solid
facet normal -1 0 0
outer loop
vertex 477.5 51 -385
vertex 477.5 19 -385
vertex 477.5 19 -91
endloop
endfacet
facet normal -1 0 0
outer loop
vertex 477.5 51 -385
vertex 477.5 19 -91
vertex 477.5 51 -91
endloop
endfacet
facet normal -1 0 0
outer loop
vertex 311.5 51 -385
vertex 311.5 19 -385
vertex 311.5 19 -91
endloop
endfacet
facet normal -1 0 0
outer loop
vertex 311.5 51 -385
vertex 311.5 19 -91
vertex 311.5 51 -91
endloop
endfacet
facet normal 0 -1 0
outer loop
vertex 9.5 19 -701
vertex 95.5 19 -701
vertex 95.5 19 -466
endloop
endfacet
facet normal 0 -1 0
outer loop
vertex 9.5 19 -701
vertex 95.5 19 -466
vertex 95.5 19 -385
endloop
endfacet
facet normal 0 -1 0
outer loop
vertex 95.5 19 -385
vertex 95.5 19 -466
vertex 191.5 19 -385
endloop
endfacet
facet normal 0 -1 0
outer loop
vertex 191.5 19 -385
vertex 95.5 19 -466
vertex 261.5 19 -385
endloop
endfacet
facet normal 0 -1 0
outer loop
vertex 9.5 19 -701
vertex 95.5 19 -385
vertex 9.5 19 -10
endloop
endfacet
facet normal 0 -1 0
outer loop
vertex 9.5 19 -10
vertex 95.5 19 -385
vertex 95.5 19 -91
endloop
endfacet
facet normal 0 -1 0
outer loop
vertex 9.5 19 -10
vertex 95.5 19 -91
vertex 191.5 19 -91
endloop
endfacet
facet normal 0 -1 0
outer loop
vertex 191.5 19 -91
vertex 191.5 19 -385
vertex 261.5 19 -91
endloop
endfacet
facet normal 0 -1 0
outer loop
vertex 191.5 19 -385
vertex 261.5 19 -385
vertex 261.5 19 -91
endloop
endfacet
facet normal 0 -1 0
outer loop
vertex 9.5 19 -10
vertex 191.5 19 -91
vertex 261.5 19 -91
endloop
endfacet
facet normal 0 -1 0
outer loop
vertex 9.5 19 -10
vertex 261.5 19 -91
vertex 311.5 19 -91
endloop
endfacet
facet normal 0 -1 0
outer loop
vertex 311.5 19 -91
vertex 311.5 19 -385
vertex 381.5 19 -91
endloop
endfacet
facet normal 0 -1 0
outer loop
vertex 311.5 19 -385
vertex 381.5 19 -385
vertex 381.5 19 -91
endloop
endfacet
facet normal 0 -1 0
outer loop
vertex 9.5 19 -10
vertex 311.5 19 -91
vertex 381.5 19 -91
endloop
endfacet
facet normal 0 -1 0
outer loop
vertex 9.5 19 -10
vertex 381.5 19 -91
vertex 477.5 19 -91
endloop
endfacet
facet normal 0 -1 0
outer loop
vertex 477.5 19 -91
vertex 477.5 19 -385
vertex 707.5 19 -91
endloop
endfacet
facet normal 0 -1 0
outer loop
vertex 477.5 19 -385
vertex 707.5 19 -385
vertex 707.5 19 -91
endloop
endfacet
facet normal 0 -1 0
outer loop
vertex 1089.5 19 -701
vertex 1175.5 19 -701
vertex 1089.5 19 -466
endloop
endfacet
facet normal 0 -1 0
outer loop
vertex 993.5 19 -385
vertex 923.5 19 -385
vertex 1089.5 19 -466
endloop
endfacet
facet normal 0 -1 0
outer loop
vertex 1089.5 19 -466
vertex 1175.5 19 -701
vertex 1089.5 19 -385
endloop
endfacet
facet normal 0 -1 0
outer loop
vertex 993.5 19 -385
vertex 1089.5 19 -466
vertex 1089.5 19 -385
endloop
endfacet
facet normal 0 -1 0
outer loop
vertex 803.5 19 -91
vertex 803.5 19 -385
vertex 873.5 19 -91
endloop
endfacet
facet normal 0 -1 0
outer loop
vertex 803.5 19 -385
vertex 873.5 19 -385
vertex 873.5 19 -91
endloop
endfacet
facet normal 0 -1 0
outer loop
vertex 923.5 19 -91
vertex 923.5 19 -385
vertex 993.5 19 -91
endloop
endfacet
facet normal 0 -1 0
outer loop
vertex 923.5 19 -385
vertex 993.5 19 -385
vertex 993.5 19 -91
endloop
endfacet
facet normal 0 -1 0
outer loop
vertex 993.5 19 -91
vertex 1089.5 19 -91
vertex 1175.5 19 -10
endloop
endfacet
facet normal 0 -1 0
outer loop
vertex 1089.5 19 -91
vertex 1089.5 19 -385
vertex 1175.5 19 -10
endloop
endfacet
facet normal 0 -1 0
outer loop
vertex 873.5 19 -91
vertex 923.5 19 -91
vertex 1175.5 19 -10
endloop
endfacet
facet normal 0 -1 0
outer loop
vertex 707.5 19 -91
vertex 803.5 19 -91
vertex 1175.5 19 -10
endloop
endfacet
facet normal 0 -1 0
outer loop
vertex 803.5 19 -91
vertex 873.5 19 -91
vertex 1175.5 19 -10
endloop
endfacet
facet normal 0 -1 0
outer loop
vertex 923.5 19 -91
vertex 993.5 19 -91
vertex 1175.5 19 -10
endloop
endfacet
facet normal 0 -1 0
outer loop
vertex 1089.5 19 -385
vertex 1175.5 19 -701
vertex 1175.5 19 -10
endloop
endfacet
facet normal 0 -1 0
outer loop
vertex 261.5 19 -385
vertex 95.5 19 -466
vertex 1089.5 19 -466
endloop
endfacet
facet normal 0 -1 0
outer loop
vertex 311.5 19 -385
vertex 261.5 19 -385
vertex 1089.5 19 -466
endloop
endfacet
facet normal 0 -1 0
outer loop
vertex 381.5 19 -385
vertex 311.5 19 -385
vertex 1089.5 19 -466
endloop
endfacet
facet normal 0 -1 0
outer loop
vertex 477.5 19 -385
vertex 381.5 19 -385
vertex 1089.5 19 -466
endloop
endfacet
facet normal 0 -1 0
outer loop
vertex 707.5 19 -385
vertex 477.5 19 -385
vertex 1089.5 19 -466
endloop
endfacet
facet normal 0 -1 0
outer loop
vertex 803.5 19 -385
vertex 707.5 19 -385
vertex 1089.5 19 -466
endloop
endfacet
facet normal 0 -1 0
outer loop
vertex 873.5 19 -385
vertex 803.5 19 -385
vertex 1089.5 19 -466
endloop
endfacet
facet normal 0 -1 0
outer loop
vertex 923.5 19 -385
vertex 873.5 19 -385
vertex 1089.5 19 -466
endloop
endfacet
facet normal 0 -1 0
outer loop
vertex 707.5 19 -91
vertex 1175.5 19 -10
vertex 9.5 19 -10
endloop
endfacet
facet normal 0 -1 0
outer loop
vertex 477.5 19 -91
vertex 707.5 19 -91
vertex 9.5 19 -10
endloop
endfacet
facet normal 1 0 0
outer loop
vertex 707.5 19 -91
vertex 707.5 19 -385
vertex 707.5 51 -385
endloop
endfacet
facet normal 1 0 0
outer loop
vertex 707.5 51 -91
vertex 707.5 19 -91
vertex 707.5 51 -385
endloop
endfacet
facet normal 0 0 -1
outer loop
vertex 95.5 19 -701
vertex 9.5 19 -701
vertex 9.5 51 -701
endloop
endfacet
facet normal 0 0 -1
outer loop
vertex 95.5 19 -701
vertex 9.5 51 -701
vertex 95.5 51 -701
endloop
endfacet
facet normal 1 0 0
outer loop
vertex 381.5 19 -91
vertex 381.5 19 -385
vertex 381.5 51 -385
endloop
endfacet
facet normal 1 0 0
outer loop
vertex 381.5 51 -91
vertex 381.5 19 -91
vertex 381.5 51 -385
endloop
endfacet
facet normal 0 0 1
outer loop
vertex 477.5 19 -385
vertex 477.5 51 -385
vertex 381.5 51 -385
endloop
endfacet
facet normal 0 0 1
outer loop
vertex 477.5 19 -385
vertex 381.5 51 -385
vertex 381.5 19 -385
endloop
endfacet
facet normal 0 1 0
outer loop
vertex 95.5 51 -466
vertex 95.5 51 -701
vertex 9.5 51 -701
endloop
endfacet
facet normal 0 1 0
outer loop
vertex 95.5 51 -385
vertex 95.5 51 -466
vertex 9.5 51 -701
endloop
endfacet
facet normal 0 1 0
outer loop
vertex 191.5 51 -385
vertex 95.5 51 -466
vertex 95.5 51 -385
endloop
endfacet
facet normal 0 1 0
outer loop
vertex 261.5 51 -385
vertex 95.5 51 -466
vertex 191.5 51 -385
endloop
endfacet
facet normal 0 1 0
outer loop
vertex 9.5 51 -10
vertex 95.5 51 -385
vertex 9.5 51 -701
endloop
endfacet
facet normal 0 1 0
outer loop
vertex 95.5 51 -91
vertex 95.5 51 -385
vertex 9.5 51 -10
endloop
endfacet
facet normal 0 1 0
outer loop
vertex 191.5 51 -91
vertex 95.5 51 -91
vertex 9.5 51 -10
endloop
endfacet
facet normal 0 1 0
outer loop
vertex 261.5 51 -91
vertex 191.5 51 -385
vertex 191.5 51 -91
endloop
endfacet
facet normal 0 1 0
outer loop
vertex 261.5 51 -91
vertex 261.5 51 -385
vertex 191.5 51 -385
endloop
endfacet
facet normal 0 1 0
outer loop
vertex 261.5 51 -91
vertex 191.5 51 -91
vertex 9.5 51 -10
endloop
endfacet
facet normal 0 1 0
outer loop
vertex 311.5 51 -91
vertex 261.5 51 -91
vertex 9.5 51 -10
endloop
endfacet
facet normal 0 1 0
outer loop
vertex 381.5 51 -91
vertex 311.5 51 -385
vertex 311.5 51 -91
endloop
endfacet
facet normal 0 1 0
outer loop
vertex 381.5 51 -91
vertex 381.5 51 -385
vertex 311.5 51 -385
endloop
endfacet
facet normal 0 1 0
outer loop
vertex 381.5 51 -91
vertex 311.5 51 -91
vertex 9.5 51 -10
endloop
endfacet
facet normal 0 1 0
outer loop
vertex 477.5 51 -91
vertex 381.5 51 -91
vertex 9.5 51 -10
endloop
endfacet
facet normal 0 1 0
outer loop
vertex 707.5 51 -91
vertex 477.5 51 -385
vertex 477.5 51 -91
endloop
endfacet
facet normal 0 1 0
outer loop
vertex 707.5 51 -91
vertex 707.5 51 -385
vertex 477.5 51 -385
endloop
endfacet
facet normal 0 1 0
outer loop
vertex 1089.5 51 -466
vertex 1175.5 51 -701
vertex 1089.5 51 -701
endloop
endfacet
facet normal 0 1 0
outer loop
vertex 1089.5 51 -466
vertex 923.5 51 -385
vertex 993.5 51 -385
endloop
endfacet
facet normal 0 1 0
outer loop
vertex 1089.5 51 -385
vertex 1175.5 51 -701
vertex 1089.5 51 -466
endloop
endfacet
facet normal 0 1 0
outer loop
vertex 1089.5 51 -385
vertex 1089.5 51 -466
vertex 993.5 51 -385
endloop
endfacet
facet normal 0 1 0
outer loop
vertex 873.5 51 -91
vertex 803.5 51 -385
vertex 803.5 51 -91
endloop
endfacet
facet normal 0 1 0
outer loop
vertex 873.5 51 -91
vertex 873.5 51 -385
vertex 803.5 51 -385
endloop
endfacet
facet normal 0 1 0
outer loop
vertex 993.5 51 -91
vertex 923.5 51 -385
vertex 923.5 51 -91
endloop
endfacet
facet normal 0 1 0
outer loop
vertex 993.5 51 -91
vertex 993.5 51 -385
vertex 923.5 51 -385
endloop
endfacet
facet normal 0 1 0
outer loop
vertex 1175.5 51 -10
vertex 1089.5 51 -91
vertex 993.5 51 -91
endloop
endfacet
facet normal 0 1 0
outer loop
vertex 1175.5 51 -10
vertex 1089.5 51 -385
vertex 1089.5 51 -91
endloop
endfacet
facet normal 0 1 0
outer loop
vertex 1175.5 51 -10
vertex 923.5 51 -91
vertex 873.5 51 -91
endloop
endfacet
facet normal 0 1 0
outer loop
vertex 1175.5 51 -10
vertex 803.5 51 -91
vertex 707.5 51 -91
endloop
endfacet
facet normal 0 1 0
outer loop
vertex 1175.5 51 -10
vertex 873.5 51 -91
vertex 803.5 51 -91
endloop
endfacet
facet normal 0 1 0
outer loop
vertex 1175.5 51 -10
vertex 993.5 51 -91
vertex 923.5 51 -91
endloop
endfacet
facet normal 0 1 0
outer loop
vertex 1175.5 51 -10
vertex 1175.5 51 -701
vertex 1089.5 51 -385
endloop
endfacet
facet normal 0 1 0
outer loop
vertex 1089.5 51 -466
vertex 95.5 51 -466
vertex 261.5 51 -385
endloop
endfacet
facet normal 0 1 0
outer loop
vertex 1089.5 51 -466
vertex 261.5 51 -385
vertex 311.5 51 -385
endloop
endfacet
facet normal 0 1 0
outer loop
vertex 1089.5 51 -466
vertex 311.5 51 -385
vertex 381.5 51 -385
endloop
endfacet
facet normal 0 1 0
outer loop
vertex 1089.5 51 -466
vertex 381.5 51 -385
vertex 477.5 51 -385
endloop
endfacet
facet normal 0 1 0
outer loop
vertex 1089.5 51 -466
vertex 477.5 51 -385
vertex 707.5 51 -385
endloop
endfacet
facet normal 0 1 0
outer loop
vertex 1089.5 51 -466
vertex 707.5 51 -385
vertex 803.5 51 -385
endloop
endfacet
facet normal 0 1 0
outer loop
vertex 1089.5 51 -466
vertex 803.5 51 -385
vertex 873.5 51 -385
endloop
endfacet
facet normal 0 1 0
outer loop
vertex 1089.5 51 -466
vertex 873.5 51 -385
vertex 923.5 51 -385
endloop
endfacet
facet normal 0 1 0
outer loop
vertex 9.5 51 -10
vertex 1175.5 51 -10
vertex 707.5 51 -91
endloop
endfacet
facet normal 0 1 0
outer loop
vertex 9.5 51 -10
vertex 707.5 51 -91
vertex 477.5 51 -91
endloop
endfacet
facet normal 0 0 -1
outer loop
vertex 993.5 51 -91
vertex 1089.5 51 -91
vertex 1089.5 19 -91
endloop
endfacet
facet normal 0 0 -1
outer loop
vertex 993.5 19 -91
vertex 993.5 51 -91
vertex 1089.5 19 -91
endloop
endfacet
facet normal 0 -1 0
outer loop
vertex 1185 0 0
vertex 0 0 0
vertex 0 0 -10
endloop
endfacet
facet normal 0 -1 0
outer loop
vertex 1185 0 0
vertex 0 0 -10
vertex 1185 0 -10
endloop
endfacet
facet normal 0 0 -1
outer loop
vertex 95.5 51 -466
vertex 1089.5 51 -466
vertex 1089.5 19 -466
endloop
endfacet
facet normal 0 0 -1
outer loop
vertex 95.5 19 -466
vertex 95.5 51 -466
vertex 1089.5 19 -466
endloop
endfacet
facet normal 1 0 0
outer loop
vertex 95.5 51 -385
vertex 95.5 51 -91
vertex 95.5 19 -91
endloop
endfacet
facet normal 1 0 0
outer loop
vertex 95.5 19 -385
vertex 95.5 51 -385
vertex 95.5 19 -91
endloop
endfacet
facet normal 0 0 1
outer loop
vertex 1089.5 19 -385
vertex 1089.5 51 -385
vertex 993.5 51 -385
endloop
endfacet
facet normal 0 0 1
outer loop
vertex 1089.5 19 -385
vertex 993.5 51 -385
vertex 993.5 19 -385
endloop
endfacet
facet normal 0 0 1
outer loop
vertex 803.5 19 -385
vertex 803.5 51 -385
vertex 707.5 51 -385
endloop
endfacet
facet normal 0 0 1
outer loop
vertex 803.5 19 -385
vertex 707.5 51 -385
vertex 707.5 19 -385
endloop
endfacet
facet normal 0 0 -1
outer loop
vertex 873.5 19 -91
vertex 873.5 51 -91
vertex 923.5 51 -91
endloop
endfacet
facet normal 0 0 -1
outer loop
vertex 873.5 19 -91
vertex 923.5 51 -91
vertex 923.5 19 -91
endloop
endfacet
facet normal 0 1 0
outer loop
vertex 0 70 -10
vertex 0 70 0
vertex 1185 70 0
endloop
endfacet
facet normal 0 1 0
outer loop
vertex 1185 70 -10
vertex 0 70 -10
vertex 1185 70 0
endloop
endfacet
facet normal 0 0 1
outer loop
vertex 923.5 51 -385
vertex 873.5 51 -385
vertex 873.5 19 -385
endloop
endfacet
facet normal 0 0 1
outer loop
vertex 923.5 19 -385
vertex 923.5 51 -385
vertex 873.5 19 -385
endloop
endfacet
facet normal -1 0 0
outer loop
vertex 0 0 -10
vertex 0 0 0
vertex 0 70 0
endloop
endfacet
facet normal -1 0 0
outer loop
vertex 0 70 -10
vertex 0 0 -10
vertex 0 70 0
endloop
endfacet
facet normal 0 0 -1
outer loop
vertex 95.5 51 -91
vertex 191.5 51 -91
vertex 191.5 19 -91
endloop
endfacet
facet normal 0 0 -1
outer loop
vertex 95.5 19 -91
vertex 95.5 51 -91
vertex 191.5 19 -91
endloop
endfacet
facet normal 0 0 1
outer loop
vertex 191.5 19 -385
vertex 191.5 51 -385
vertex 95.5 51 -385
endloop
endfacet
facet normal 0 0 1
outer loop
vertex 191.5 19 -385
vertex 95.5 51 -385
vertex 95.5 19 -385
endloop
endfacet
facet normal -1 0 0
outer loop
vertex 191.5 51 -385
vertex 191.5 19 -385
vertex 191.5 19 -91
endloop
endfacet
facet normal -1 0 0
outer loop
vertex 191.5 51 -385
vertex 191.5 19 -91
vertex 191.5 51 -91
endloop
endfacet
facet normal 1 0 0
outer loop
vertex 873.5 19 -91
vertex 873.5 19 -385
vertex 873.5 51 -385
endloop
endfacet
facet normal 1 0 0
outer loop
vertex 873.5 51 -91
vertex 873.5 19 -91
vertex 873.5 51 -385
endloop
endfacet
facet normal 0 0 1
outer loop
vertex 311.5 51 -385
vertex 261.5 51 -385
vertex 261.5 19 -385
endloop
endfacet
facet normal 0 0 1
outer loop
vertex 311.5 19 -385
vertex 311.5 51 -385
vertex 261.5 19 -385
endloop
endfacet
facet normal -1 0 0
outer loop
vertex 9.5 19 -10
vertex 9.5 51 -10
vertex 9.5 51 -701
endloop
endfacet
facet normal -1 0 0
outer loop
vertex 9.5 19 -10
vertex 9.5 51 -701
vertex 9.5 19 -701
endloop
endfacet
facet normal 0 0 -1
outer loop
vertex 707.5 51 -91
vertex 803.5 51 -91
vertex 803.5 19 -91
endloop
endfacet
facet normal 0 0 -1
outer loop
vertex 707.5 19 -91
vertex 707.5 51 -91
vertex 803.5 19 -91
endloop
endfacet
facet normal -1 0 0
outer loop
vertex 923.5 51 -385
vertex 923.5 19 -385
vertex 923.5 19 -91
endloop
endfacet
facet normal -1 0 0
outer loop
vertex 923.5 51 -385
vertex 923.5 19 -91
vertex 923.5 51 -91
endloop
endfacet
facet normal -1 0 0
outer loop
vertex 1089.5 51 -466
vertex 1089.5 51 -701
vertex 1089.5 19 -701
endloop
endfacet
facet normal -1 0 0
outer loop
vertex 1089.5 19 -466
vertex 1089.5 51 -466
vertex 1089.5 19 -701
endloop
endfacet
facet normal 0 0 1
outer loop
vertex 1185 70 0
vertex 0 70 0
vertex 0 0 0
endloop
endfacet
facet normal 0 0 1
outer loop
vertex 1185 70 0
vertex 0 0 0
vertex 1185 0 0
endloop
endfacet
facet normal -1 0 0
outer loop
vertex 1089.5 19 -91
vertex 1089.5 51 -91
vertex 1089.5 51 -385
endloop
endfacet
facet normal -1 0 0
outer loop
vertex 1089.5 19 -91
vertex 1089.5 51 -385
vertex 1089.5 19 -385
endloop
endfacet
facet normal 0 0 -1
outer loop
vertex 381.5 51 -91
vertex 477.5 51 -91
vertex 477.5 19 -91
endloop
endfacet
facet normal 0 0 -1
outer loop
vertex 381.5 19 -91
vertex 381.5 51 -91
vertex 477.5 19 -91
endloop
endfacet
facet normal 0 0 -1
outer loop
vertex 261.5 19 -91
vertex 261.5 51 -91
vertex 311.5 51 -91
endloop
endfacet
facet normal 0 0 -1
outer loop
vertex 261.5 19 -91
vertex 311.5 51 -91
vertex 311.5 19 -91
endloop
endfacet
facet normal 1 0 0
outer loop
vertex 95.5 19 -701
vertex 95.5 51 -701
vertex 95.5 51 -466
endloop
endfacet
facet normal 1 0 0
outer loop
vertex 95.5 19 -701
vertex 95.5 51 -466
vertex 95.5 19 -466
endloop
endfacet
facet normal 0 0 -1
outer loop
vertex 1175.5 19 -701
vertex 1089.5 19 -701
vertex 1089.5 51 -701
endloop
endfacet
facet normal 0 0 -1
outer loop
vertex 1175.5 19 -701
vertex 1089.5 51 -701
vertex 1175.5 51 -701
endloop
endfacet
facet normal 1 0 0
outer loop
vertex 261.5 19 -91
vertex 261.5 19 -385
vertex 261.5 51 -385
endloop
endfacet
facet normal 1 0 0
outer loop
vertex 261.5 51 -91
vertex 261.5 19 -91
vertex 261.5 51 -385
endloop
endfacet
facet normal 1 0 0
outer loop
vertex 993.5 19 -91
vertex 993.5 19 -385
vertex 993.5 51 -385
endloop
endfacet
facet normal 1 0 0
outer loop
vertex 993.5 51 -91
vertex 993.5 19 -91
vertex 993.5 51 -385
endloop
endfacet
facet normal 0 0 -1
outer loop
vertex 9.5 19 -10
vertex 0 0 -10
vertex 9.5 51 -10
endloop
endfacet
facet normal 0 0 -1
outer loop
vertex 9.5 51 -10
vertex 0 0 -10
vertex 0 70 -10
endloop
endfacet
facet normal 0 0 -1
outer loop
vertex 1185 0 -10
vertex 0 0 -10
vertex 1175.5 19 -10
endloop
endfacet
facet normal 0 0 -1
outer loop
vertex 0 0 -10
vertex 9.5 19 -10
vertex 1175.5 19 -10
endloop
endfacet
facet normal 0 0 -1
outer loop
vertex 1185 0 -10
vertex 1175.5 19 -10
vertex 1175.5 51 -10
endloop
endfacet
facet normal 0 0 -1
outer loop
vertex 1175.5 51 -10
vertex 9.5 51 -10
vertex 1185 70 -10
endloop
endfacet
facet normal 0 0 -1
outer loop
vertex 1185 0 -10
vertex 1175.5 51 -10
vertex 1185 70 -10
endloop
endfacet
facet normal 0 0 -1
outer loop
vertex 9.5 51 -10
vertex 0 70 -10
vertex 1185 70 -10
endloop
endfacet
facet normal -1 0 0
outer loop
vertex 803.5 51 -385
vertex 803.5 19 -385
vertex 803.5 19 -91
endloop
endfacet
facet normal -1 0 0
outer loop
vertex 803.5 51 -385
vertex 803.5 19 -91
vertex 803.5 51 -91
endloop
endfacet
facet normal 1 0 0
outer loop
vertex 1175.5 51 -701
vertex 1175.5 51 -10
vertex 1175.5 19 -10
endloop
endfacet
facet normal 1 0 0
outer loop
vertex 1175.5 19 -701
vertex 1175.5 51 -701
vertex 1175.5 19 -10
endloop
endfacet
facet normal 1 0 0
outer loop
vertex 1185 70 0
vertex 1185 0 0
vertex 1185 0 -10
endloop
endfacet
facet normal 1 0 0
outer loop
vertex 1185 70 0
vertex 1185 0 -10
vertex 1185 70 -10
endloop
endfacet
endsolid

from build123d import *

# Parameters (mm, degrees)
F0_W     = 1185
F0_H     = 70
F1_DEPTH = 10
F2_W     = 86
F2_H     = 32
F3_DEPTH = 691
F4_W     = 32
F4_H     = 81
F5_DEPTH = 994
F6_W     = 70
F6_H     = 32
F6_W_2   = 230
F7_DEPTH = 294


with BuildPart() as f1:
    # F0 (on Top) → F1 (new body)
    with BuildSketch(Plane.XY):
        with Locations((592.5, 35)):
            Rectangle(F0_W, F0_H)
    extrude(amount=-F1_DEPTH)

    # F2 (on face) → F3 (join)
    with BuildSketch(Plane(origin=(0, 0, -10), x_dir=(1, 0, 0), z_dir=(0, 0, -1))):
        with Locations((52.5, -35)):
            Rectangle(F2_W, F2_H)
        with Locations((1132.5, -35)):
            Rectangle(F2_W, F2_H)
    extrude(amount=F3_DEPTH)

    # F4 (on face) → F5 (join, through all)
    with BuildSketch(Plane(origin=(1089.5, 0, 0), x_dir=(0, -1, 0), z_dir=(-1, 0, 0))):
        with Locations((-35, -50.5)):
            Rectangle(F4_W, F4_H)
        with Locations((-35, -425.5)):
            Rectangle(F4_W, F4_H)
    extrude(amount=F5_DEPTH)

    # F6 (on face) → F7 (join, through all)
    with BuildSketch(Plane.XY.offset(-385)):
        with Locations((958.5, 35)):
            Rectangle(F6_W, F6_H)
        with Locations((838.5, 35)):
            Rectangle(F6_W, F6_H)
        with Locations((592.5, 35)):
            Rectangle(F6_W_2, F6_H)
        with Locations((346.5, 35)):
            Rectangle(F6_W, F6_H)
        with Locations((226.5, 35)):
            Rectangle(F6_W, F6_H)
    extrude(amount=F7_DEPTH)


solid = f1.part
